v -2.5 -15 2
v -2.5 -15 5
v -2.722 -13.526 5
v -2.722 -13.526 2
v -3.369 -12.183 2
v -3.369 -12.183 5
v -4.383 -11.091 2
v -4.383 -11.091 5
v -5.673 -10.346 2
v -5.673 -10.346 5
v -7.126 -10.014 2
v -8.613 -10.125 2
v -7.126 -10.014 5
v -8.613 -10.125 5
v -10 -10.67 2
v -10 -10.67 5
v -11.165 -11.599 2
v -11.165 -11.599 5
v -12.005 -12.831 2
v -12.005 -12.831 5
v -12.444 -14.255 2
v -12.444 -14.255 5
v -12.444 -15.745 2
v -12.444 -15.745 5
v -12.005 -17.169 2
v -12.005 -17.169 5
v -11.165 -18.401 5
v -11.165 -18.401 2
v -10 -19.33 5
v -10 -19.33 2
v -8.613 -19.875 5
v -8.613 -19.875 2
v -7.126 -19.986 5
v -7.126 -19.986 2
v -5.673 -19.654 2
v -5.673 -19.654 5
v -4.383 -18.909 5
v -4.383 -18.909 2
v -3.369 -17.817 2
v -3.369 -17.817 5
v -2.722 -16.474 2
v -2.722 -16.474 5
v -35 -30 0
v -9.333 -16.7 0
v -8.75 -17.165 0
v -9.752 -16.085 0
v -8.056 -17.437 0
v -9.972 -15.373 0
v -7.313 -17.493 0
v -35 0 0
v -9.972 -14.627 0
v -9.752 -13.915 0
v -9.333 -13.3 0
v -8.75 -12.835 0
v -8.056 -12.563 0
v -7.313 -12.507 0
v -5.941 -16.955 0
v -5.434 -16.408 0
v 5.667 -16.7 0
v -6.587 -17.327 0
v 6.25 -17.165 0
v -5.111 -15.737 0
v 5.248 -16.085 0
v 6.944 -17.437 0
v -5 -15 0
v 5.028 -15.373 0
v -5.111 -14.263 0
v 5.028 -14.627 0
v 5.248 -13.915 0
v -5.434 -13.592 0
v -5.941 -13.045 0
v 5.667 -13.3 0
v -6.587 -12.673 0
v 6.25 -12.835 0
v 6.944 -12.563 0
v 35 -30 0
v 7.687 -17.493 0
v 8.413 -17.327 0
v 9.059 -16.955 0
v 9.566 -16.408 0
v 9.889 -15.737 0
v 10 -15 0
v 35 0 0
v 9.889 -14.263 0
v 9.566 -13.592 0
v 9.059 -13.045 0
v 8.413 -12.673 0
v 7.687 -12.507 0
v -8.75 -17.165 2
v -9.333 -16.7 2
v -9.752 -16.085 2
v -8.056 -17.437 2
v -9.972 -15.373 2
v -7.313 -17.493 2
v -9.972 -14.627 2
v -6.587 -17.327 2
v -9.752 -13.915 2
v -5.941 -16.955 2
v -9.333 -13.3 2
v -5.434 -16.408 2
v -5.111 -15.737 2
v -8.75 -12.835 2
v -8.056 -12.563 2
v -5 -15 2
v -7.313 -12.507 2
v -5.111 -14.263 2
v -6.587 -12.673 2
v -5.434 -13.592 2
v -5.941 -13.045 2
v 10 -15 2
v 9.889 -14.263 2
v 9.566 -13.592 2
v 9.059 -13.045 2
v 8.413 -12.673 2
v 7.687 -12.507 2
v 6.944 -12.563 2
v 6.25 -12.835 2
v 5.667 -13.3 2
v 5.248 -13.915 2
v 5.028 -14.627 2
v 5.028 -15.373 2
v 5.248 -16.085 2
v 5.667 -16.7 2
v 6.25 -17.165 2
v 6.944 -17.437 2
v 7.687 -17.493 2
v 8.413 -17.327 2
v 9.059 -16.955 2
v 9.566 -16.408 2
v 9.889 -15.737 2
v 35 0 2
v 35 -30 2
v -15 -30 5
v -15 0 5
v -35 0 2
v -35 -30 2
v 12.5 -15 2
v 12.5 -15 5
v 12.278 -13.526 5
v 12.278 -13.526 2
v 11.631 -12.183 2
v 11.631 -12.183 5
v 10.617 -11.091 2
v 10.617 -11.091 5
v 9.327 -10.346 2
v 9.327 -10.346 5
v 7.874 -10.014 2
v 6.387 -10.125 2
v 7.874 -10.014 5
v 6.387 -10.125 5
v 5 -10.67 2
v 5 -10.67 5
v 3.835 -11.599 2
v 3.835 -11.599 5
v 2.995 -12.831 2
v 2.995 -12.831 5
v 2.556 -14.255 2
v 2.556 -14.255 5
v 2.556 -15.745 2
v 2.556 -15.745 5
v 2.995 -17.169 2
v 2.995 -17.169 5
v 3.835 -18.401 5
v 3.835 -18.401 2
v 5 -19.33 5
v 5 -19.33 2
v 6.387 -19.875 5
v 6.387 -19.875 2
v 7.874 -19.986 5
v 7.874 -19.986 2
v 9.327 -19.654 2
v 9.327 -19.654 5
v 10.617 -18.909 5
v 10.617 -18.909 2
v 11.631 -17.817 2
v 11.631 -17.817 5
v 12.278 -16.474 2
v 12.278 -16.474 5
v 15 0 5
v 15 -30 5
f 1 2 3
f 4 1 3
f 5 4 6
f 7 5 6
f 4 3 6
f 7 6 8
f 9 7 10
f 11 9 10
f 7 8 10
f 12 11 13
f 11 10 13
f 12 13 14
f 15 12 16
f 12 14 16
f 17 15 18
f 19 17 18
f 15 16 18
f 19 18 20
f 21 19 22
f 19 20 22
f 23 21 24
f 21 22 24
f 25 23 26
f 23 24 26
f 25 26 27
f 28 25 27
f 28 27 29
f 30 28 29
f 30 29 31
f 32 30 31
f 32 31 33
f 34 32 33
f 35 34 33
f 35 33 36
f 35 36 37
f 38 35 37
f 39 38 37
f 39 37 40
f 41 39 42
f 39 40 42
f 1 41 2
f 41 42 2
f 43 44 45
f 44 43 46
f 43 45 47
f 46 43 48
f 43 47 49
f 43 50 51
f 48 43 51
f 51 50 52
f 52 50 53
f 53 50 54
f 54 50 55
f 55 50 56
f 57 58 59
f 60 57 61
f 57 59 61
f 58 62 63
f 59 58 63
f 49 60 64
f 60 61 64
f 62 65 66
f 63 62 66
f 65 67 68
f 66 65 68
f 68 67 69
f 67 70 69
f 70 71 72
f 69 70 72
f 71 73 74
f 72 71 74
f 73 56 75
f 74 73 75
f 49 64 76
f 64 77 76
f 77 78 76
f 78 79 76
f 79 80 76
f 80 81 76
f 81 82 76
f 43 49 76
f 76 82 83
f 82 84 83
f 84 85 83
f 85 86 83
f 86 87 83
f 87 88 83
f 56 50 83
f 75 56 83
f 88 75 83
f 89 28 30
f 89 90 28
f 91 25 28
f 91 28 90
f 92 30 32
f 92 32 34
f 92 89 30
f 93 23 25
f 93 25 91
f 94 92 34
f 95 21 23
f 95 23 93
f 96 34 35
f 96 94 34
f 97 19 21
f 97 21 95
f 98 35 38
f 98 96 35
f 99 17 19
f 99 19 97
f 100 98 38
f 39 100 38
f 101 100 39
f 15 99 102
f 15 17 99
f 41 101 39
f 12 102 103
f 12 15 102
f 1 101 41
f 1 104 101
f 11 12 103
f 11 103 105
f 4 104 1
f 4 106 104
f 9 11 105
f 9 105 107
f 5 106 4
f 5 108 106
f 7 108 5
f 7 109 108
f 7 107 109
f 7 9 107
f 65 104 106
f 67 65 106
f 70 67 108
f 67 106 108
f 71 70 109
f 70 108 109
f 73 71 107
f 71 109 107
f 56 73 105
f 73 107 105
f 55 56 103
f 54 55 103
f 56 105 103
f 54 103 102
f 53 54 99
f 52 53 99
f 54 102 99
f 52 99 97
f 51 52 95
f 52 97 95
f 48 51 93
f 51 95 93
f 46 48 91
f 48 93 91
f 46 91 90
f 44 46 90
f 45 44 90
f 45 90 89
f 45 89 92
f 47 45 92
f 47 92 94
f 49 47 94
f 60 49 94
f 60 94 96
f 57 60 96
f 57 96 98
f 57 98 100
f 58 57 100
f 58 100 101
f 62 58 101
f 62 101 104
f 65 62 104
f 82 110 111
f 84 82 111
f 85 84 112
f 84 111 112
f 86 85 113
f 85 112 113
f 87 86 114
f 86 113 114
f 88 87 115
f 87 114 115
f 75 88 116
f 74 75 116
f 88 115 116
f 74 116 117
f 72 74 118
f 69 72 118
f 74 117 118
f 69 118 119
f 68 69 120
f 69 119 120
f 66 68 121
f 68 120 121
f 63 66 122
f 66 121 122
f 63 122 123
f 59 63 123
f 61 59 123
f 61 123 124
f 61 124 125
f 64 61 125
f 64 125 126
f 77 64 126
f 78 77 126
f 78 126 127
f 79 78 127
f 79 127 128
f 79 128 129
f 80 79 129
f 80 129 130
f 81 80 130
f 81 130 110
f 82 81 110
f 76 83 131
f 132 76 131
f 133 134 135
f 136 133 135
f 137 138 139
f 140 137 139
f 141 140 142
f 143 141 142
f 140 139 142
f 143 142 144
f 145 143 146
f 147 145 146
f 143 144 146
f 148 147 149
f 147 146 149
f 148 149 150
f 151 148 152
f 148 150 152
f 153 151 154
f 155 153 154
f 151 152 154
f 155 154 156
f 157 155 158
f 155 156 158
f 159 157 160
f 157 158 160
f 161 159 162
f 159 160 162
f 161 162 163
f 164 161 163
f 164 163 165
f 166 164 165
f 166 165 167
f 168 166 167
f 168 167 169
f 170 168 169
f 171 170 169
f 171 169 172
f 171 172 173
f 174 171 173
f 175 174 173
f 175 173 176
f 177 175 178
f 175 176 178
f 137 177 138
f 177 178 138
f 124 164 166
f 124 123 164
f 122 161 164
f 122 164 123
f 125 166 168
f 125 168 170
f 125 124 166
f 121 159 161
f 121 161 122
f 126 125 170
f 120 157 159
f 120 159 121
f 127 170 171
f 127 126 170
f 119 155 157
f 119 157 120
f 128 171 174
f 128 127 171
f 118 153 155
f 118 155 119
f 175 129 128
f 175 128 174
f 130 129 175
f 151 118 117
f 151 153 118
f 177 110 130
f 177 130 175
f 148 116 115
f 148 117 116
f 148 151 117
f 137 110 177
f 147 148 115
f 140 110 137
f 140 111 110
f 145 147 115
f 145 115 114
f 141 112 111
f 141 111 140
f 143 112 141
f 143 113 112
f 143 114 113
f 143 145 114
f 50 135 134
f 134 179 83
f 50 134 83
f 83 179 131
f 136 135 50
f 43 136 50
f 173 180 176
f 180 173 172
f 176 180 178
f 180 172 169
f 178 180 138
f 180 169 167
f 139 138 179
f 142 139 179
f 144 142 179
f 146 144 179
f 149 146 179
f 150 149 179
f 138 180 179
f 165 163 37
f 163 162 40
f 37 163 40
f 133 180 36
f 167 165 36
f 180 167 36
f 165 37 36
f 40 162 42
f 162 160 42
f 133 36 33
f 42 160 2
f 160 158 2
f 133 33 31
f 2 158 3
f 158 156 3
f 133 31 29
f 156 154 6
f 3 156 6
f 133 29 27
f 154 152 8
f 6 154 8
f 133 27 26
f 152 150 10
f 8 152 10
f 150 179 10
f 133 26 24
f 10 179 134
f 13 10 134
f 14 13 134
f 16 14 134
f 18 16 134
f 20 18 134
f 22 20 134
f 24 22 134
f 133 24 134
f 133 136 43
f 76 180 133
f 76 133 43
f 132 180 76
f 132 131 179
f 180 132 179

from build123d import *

# Parameters (mm, degrees)
F1_DEPTH = 30
F2_R     = 5
F3_DEPTH = 3
F4_R     = 2.5
F5_DEPTH = 10
F6_R     = 2.5
F7_DEPTH = 25


with BuildPart() as f1:
    # F0 (on Front) → F1 (new body)
    with BuildSketch(Plane.XZ):
        Polygon((-35, 0), (0, 0), (35, 0), (35, 2), (15, 5), (0, 5), (-15, 5), (-35, 2), align=None)
    extrude(amount=F1_DEPTH)

    # F2 (on face) → F3 (cut)
    with BuildSketch(Plane.XY.offset(5)):
        with Locations((-7.5, -15)):
            Circle(F2_R)
        with Locations((7.5, -15)):
            Circle(F2_R)
    extrude(amount=-F3_DEPTH, mode=Mode.SUBTRACT)

    # F4 (on face) → F5 (cut)
    with BuildSketch(Plane.XY.offset(2)):
        with Locations((-7.5, -15)):
            Circle(F4_R)
    extrude(amount=-F5_DEPTH, mode=Mode.SUBTRACT)

    # F6 (on face) → F7 (cut)
    with BuildSketch(Plane.XY.offset(2)):
        with Locations((7.5, -15)):
            Circle(F6_R)
    extrude(amount=-F7_DEPTH, mode=Mode.SUBTRACT)


solid = f1.part
